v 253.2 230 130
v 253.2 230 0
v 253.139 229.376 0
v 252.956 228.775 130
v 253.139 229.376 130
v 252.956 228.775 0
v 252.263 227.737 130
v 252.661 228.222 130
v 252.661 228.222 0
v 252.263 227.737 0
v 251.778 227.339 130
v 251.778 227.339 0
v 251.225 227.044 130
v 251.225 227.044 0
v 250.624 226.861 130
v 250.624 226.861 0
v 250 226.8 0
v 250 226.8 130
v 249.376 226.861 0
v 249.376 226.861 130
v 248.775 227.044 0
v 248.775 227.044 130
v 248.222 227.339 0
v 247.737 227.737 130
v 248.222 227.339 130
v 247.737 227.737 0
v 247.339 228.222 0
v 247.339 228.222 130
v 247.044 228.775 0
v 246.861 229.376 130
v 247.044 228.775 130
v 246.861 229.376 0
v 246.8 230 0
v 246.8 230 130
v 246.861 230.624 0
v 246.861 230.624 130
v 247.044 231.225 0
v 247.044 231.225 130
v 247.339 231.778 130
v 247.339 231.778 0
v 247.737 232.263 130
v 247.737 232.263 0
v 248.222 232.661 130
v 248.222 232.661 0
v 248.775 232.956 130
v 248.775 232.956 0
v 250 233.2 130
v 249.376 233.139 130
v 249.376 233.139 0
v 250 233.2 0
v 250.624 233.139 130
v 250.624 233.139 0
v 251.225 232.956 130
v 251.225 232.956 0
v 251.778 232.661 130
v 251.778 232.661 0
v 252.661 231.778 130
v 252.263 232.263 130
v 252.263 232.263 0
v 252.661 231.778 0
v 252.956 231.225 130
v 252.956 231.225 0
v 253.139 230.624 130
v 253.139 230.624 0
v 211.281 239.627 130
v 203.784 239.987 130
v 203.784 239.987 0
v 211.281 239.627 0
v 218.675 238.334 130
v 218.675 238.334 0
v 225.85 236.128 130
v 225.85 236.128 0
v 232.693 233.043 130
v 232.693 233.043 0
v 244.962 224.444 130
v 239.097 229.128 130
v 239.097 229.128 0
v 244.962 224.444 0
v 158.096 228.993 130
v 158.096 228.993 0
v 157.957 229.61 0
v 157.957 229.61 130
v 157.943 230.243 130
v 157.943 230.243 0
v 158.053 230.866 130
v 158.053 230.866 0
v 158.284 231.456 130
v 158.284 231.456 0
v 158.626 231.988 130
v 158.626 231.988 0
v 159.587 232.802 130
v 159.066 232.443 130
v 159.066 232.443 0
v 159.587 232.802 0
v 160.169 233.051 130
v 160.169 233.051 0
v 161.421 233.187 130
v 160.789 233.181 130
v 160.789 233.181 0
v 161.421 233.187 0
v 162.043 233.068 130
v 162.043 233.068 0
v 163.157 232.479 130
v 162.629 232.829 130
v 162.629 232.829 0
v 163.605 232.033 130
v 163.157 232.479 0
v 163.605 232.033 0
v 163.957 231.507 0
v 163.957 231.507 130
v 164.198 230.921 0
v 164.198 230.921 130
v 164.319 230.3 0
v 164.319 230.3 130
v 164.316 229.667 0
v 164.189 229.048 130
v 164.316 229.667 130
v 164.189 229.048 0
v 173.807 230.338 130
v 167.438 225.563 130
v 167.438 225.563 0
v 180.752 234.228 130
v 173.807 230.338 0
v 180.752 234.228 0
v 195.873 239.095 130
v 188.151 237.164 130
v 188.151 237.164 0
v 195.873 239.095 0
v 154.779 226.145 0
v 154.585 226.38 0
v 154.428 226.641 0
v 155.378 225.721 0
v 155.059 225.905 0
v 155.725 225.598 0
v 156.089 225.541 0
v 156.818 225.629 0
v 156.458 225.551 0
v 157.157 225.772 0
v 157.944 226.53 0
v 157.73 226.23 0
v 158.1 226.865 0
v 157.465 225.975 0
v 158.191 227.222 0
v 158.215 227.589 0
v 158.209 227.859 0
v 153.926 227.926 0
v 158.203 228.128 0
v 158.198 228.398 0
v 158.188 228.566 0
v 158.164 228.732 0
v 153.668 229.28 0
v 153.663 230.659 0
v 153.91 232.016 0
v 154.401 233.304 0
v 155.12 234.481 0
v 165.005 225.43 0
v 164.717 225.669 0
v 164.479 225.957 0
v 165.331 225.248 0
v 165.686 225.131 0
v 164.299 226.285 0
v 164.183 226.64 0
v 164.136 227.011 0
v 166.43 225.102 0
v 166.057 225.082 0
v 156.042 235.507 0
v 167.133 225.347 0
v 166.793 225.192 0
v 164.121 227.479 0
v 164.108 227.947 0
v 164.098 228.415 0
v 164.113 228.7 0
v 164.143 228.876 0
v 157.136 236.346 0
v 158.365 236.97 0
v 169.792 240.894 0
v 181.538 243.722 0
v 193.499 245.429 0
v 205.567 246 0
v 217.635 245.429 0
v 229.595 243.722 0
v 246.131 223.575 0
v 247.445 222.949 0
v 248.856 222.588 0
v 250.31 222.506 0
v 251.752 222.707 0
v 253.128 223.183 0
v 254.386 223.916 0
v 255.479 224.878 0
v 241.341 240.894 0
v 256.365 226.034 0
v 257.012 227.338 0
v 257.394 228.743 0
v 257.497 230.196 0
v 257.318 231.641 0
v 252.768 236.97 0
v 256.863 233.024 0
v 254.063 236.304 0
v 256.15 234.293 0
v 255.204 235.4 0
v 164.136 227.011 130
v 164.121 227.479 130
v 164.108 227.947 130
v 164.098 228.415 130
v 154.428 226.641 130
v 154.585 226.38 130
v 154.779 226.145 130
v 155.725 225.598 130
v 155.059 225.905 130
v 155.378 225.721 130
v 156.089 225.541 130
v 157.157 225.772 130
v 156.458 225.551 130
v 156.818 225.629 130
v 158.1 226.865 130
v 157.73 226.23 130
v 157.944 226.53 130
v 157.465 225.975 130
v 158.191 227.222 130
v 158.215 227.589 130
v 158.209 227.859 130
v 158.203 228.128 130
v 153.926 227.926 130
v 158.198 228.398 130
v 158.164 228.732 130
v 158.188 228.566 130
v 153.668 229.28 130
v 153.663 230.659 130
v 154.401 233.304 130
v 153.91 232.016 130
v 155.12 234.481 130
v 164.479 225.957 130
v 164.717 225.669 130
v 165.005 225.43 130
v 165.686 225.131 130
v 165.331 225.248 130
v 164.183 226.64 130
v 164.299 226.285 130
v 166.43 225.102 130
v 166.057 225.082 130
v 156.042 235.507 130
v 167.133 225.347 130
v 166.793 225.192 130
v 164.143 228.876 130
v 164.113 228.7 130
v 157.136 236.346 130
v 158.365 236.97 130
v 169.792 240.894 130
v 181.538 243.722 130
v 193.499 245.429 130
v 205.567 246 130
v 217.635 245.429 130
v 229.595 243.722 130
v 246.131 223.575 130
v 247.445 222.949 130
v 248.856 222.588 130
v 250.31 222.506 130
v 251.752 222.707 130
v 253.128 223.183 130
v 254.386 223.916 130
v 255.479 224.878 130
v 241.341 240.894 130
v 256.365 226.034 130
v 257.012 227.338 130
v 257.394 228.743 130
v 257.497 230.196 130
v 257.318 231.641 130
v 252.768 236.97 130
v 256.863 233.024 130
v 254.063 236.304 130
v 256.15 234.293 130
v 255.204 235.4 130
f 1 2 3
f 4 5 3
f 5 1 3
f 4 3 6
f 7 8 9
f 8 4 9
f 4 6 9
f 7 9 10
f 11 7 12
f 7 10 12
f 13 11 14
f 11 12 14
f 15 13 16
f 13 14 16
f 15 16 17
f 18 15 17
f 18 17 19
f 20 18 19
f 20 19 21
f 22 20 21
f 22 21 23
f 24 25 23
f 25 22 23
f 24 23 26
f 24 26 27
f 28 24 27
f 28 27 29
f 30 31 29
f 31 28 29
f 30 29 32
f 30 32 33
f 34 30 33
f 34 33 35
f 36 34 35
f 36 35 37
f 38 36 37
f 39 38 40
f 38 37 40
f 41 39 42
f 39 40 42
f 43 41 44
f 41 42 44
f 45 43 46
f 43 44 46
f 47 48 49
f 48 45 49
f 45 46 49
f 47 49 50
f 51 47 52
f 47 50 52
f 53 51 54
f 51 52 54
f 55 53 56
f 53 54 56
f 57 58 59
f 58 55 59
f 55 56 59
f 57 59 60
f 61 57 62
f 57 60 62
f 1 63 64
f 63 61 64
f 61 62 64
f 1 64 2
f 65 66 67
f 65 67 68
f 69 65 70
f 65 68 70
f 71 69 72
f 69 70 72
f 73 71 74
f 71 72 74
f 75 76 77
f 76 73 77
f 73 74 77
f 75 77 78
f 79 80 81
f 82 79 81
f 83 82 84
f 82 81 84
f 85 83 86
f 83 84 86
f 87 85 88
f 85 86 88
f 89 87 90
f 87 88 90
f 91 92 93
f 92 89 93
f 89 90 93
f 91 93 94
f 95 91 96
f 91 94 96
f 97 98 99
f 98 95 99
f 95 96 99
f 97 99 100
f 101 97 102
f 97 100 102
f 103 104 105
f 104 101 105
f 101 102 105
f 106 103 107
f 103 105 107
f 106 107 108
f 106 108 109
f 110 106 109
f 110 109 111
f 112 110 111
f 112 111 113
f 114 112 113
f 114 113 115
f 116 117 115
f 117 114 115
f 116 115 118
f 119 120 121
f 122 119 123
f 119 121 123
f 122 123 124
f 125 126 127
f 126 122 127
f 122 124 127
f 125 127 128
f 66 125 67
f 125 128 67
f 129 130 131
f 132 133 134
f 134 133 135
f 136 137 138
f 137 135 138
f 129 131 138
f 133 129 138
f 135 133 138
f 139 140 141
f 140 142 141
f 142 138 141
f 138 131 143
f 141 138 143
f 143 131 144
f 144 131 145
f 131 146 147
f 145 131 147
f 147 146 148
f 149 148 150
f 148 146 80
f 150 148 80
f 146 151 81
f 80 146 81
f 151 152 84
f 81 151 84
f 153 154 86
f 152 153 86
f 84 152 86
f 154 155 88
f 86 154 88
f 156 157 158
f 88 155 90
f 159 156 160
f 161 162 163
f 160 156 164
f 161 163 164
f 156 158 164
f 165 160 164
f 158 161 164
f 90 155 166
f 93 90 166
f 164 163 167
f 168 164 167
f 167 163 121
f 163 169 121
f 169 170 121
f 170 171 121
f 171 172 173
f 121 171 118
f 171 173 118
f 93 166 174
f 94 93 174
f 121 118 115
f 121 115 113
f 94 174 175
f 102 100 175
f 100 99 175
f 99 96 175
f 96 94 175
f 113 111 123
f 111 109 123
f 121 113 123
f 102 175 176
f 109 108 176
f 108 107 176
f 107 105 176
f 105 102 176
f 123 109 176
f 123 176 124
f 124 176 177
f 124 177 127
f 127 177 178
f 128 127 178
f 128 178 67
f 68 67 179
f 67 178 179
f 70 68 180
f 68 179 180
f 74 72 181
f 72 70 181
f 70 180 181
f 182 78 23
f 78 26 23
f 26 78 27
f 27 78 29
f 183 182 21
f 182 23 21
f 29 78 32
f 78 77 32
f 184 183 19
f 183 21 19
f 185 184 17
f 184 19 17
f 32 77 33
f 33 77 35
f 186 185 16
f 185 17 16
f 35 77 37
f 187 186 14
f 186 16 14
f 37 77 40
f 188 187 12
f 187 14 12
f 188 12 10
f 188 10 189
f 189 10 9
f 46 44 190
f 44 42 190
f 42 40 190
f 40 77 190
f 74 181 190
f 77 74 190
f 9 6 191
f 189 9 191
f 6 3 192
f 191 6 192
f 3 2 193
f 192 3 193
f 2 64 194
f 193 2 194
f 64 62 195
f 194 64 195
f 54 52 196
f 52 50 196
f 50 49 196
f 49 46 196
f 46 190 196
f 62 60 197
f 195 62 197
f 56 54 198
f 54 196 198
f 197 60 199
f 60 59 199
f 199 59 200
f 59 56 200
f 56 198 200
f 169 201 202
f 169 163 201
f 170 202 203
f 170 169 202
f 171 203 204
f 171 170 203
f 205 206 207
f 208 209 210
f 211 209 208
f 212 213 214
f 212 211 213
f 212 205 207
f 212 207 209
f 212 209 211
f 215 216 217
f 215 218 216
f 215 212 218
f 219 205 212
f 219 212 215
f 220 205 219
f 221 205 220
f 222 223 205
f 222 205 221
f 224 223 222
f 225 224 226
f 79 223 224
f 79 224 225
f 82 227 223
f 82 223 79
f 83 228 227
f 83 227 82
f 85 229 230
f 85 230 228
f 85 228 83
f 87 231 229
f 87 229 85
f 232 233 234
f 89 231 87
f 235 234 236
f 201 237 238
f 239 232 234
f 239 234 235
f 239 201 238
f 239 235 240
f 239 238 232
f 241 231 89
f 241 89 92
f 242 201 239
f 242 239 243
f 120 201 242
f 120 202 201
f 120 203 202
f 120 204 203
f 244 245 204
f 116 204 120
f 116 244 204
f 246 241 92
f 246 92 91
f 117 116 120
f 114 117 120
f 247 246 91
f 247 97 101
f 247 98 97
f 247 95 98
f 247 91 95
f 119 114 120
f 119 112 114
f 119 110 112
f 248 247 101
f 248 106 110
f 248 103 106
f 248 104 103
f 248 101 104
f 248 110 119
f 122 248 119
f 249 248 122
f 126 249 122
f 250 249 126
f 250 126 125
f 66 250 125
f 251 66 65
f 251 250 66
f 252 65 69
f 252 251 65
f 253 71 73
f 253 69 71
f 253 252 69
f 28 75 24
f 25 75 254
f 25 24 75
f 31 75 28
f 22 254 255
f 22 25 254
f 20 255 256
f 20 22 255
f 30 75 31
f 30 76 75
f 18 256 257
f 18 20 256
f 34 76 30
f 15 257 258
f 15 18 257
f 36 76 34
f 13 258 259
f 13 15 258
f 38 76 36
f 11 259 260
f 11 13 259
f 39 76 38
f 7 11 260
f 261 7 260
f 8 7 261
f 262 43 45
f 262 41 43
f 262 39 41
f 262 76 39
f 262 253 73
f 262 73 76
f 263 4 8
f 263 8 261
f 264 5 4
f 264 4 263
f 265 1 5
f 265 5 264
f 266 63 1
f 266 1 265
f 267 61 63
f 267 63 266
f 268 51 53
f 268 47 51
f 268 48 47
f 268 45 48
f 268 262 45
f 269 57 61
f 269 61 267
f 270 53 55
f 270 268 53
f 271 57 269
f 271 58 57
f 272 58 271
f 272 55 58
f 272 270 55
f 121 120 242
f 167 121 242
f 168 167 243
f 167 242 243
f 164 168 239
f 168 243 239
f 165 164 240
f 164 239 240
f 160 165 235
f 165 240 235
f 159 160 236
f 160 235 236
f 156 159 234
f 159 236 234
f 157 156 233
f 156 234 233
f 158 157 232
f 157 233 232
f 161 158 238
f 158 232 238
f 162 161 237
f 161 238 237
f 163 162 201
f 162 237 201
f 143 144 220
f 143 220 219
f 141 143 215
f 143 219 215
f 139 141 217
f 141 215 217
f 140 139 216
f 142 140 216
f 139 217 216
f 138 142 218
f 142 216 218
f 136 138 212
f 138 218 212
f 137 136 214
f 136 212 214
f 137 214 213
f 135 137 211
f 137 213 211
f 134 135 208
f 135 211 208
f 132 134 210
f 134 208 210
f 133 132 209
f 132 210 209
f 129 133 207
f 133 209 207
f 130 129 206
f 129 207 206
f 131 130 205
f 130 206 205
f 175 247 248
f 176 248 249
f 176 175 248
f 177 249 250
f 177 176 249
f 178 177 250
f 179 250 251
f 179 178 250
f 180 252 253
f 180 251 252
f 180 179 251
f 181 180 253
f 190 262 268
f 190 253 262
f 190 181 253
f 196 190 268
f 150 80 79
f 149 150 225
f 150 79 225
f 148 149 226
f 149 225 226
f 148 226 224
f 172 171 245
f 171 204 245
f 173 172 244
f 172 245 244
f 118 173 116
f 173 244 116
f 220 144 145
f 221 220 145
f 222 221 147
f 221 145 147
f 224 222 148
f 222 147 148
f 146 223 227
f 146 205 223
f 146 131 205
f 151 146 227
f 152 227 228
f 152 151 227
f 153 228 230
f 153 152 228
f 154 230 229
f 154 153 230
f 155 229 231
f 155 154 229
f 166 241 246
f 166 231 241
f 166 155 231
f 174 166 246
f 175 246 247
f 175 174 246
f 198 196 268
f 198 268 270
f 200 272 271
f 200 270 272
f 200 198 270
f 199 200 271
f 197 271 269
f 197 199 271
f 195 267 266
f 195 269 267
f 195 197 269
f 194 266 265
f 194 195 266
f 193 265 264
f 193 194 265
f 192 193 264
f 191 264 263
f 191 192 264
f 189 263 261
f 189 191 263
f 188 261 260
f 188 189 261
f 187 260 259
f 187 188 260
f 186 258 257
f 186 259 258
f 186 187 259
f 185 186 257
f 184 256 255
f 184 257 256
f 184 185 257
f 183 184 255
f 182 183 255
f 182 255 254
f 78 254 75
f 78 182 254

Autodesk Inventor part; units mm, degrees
ref_plane "YZ Plane" through (0, 0, 0) normal (1, 0, 0) x (0, 1, 0)
ref_plane "XZ Plane" through (0, 0, 0) normal (0, 1, 0) x (-1, 0, 0)
ref_plane "XY Plane" through (0, 0, 0) normal (0, 0, 1) x (1, 0, 0)
ref_plane "作業平面1" through (0, 0, 0) normal (0, 0, 1) x (1, 0, 0)
sketch "スケッチ1" plane through (0, 0, 0) normal (0, 0, 1) x (1, 0, 0)
  circle A0 centre (250, 230) radius 3 construction
  line L0 (246.124, 222.5) -> (255, 222.5) construction
  circle A1 centre (239, 219) radius 3 construction
  circle A2 centre (161.1336, 230) radius 3 construction
  arc A3 (-159.3342, 234.665) -> (159.3342, 234.665) centre (0, 647.734) ccw construction
  line L1 (250, 235) -> (161.1336, 235) construction
  circle A4 centre (250, 230) radius 3.2
  circle A5 centre (161.1336, 230) radius 3.2
  circle A6 centre (250, 230) radius 7.5 construction
  circle A7 centre (161.1336, 230) radius 7.5 construction
  line L2 (250, 230) -> (161.1336, 230) construction
  line L3 (205.5668, 230) -> (205.5668, 246) construction
  arc A8 (252.7682, 236.9705) -> (158.3654, 236.9705) centre (205.5668, 118.1142) ccw
  arc A9 (243.602, 233.9135) -> (167.5316, 233.9135) centre (205.5668, 118.1142) ccw
  arc A10 (243.602, 233.9135) -> (252.7682, 236.9705) centre (250, 230) ccw
  arc A11 (158.3654, 236.9705) -> (167.5316, 233.9135) centre (161.1336, 230) ccw
  point P0 (0, 0)
  dimension "d0" = 6.4
  dimension "d1" = 15
  dimension "d2" = 16
  dimension "d3" = 6
extrude "押し出し1" add sketch "スケッチ1" along normal blind 130
fillet "フィレット1" radius 60 2 edges at (243.602, 233.9135, 65) (167.5316, 233.9135, 65)
sketch "スケッチ2" plane through (0, 0, 0) normal (0, 0, -1) x (-1, 0, 0)
  arc A0 (-166.1782, 224.45) -> (-158.3654, 236.9705) centre (-161.1336, 230) ccw projected
  circle A1 centre (-161.1336, 230) radius 3.2 projected
  circle A2 centre (-250, 230) radius 3.2 projected
  circle A3 centre (-250, 230) radius 88.8664 construction
  arc A4 (-158.4511, 222.9961) -> (-158.1923, 228.7397) centre (-250, 230) ccw
  arc A5 (-164.3511, 223.2252) -> (-164.0923, 228.7808) centre (-250, 230) ccw
  point P0 (0, 0)
  dimension "d7" = 2.95
  dimension "d8" = 2.95
extrude "押し出し2" cut sketch "スケッチ2" against normal through all contours A5 A1 A4 A0
fillet "フィレット2" radius 2 4 edges at (158.4511, 222.9961, 65) (164.3511, 223.2252, 65) (164.0923, 228.7808, 65) (158.1923, 228.7397, 65)
equation "\"d8\" = d7"
properties part number "foot_01"
